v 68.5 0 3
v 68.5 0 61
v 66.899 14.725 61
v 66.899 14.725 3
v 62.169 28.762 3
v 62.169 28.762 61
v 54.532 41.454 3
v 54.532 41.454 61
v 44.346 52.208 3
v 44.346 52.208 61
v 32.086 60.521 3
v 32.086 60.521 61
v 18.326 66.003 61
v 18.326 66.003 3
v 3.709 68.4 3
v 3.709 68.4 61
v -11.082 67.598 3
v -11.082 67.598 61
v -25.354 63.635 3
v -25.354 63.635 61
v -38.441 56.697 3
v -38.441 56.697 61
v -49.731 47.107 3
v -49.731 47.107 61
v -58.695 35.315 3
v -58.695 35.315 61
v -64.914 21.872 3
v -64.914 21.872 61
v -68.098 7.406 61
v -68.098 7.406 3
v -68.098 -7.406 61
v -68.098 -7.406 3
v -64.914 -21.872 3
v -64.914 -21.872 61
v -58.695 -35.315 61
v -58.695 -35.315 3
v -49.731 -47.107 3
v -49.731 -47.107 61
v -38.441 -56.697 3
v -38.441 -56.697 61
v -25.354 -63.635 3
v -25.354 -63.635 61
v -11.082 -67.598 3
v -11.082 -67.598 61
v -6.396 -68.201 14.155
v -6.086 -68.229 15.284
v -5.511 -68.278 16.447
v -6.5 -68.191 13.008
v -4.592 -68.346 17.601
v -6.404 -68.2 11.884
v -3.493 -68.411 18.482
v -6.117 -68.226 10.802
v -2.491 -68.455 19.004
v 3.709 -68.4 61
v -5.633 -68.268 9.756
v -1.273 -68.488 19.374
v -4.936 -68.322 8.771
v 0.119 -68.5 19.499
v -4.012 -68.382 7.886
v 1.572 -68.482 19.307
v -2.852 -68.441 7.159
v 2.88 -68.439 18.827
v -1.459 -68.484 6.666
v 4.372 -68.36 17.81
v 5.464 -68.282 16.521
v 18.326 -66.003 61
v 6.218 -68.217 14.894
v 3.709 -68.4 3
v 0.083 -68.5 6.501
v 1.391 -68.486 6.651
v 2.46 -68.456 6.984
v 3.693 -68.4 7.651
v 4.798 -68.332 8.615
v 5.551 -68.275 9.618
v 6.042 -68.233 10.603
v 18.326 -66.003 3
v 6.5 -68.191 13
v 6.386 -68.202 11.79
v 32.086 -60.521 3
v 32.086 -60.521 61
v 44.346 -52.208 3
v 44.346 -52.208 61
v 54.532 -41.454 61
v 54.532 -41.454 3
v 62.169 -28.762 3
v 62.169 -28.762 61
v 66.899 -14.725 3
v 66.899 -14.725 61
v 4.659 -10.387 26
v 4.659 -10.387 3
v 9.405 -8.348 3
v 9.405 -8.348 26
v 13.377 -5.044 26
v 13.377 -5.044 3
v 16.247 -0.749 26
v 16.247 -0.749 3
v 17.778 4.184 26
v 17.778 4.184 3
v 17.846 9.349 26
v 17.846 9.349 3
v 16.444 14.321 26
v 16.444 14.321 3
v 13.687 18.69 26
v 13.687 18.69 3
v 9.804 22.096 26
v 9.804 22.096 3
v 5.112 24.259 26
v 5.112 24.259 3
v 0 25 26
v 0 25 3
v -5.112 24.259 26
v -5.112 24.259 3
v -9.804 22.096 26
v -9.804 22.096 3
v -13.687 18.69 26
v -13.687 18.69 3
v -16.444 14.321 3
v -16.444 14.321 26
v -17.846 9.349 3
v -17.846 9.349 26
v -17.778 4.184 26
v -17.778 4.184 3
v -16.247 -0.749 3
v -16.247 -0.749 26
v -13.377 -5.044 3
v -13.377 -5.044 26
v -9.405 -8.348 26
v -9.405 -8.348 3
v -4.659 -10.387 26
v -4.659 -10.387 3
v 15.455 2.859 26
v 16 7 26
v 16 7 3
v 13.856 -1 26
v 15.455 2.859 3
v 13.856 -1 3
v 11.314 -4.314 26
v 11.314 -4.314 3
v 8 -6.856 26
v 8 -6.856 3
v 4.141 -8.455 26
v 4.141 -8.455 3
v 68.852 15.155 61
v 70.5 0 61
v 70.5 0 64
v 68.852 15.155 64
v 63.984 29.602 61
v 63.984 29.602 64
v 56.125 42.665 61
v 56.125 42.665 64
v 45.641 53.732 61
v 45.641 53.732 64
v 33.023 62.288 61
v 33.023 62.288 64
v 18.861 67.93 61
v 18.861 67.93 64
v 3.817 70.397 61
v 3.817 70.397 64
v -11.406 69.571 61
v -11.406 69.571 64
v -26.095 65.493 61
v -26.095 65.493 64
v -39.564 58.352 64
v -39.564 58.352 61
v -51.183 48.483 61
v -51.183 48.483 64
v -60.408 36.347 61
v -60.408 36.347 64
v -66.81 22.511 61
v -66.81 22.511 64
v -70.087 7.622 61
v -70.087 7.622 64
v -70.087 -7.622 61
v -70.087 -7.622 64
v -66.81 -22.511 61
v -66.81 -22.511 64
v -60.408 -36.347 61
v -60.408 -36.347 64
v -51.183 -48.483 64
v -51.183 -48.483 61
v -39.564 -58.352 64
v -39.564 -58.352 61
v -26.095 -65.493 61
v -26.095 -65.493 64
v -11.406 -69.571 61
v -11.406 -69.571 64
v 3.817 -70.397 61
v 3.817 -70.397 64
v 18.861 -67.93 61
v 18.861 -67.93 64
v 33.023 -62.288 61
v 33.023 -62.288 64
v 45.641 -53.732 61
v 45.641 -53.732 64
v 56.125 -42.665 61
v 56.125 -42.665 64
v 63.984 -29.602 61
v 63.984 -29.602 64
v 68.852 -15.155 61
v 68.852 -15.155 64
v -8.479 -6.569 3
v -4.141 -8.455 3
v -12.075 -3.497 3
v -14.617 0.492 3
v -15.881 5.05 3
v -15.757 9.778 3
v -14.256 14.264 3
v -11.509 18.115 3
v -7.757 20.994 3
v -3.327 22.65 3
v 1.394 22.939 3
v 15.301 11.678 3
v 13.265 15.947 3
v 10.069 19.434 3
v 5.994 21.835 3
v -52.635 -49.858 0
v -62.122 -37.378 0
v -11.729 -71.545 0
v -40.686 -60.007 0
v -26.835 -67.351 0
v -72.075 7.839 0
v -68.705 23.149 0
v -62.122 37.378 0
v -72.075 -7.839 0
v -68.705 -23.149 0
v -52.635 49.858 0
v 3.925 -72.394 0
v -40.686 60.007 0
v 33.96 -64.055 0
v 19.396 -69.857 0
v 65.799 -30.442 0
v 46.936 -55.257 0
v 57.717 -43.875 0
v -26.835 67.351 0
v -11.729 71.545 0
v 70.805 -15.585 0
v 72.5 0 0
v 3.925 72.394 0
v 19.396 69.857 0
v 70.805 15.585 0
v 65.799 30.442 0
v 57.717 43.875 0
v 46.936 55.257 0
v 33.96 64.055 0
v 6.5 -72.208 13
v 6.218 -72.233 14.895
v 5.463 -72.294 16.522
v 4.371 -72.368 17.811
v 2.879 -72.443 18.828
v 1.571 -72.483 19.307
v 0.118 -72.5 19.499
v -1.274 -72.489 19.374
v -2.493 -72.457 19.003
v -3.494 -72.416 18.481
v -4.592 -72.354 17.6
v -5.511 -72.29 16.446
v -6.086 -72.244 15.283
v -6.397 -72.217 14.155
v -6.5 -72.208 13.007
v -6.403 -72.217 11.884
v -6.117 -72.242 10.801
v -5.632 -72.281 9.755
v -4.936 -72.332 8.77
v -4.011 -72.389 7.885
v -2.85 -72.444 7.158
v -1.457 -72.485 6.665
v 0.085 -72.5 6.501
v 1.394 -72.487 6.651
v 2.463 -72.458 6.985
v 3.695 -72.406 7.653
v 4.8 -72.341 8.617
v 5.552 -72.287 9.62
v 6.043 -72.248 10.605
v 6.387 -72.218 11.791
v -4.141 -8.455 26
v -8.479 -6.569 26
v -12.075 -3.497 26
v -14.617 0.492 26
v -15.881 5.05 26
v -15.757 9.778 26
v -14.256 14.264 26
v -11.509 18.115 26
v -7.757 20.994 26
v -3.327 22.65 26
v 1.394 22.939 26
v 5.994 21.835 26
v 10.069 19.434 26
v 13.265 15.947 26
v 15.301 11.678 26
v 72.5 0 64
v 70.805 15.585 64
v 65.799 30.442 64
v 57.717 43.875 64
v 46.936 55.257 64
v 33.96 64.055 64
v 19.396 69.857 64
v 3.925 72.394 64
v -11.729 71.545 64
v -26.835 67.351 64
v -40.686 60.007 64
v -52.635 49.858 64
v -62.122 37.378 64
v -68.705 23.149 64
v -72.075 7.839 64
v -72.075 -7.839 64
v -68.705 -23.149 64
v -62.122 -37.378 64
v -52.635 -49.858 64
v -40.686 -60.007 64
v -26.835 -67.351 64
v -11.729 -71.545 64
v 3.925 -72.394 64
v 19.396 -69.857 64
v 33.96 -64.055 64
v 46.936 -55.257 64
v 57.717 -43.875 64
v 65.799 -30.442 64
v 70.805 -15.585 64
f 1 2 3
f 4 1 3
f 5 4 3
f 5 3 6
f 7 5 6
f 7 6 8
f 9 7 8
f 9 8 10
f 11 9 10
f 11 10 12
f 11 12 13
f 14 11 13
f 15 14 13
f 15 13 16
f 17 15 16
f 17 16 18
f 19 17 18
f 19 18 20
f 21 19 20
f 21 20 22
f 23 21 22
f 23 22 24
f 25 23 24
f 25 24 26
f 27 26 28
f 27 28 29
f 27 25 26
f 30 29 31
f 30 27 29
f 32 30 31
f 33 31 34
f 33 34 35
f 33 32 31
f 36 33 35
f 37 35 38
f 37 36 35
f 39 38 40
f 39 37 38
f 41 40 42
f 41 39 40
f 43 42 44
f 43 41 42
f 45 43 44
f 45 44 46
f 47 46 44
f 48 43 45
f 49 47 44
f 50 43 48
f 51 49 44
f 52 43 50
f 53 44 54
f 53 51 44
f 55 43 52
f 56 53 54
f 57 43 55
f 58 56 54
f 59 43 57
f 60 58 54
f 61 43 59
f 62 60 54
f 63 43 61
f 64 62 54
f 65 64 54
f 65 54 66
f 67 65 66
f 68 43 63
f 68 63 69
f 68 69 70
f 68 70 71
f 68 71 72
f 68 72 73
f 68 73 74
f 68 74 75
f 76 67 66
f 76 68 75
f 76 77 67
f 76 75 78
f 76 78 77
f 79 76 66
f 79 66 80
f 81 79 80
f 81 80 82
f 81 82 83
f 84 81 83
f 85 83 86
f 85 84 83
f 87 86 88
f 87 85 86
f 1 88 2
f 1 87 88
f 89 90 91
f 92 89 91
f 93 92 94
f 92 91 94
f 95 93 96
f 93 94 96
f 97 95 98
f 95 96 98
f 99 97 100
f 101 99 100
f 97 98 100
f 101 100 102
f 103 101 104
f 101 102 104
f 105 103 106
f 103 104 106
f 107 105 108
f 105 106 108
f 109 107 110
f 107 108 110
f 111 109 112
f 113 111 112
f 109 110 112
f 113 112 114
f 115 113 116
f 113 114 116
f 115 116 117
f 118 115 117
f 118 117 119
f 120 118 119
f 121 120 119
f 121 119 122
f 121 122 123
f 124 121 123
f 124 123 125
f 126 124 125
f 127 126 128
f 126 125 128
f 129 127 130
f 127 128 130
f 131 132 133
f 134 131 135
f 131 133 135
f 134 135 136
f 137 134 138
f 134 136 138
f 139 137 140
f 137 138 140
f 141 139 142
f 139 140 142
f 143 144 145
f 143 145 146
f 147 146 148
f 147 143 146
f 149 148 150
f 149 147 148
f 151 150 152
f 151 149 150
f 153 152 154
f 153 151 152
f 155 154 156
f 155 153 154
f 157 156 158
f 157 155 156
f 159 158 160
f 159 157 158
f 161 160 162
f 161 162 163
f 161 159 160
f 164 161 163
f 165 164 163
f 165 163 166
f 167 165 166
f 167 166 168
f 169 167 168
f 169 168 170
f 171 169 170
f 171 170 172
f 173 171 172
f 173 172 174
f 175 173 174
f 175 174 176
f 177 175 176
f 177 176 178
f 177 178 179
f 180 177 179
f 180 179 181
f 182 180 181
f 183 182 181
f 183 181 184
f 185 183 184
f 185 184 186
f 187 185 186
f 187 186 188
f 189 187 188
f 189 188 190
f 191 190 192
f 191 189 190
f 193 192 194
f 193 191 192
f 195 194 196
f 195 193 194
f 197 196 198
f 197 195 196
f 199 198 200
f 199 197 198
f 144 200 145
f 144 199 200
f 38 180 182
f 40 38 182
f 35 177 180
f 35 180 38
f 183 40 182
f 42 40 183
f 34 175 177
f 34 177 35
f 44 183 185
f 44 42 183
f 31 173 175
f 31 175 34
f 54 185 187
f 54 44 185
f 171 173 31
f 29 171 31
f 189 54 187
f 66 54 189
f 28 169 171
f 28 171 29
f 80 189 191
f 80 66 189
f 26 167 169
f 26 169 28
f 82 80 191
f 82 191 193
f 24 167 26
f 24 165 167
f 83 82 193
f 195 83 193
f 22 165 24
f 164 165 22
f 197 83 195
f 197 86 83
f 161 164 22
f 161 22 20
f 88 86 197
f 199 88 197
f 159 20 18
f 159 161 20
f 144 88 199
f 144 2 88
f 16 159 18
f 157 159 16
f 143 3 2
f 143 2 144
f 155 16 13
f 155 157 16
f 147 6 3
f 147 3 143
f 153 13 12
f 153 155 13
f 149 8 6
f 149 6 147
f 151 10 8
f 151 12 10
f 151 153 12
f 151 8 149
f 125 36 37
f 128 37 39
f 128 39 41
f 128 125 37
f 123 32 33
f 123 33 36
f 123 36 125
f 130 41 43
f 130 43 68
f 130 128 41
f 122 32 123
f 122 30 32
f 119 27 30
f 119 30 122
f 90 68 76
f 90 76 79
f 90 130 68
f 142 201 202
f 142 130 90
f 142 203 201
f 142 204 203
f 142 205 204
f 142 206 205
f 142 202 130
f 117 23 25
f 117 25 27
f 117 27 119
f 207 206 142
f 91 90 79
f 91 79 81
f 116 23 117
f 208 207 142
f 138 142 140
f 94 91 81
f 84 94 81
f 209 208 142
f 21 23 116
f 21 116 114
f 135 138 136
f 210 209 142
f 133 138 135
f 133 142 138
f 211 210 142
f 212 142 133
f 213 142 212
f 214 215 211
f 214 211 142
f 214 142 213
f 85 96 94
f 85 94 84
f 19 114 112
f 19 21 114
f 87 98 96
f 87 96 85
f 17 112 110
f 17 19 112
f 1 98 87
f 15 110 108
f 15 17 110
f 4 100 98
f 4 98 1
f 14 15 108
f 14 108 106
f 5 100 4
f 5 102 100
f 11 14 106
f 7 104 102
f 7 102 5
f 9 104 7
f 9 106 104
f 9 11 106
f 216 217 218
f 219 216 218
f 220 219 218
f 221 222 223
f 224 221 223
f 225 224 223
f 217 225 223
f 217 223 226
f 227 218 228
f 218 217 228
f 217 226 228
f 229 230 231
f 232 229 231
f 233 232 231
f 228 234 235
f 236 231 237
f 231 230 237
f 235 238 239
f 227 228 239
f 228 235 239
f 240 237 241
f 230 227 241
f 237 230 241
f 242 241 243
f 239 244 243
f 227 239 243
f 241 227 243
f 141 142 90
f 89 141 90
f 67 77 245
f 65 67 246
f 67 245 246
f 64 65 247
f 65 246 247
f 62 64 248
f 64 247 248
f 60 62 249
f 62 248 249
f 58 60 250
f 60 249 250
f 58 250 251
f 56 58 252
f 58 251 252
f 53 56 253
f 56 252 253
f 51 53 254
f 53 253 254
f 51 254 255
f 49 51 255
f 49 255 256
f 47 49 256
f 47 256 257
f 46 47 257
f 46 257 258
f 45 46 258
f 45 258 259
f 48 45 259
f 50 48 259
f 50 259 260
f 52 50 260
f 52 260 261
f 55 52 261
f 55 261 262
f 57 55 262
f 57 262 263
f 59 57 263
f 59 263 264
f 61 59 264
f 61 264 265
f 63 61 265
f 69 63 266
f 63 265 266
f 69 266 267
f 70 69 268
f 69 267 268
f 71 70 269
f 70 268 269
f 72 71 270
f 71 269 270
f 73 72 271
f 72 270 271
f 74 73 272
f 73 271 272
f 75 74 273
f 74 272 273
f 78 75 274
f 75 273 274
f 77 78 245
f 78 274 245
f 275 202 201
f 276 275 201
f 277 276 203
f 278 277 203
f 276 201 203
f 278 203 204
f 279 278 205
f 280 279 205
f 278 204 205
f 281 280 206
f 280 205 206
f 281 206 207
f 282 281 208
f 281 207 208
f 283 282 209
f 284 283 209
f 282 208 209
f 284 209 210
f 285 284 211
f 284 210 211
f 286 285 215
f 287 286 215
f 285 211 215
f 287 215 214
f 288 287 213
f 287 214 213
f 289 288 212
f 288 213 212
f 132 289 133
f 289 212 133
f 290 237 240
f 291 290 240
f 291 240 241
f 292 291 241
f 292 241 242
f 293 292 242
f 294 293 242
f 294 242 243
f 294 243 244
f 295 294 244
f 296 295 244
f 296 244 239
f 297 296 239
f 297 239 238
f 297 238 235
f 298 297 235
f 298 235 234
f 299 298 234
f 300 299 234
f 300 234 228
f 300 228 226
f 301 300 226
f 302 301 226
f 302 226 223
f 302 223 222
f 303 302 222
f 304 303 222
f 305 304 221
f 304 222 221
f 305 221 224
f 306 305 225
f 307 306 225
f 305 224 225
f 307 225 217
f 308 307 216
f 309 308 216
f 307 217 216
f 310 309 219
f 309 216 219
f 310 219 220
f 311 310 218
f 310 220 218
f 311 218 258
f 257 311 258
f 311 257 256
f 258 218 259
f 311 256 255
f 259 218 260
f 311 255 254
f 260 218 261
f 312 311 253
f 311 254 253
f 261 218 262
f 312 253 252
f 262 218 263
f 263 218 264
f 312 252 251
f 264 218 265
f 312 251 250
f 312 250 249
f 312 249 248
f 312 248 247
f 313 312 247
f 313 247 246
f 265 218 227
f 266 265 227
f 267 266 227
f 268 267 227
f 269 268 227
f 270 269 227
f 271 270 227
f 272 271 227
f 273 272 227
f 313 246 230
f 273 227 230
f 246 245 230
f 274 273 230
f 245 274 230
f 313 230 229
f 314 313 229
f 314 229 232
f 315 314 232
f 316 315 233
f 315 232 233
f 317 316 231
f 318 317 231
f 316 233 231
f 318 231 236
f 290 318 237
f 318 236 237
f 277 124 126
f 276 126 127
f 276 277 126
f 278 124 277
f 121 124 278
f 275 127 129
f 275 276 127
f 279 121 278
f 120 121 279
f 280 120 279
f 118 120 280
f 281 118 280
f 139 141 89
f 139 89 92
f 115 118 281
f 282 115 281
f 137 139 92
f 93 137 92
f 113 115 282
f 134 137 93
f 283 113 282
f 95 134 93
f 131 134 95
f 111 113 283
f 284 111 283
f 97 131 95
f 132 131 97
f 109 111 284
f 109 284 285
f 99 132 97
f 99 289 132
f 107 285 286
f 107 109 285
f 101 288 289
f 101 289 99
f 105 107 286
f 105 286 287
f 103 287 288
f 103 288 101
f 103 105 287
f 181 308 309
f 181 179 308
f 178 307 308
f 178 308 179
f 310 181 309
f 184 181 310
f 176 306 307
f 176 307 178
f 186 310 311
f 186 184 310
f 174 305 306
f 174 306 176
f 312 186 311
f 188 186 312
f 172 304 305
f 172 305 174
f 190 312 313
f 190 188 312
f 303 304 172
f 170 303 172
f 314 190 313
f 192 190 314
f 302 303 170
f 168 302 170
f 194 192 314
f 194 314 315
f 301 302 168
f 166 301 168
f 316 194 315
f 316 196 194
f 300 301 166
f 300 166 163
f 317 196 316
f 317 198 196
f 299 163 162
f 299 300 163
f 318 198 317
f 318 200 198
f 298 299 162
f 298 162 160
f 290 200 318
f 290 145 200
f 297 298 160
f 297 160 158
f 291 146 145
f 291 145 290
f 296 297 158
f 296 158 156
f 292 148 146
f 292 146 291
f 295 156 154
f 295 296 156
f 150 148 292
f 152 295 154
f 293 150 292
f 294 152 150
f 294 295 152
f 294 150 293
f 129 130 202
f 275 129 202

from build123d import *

# Parameters (mm, degrees)
F0_R     = 72.5
F0_R_2   = 70.5
F1_DEPTH = 64
F0_R_3   = 68.5
F2_DEPTH = 61
F3_DEPTH = 3
F5_DEPTH = 23
F7_R     = 6.5
F8_DEPTH = 25


with BuildPart() as f1:
    # F0 (on Top) → F1 (new body)
    with BuildSketch(Plane.XY):
        Circle(F0_R)
        Circle(F0_R_2, mode=Mode.SUBTRACT)
    extrude(amount=F1_DEPTH)

    # F0 (on Top) → F2 (join)
    with BuildSketch(Plane.XY):
        Circle(F0_R_2)
        Circle(F0_R_3, mode=Mode.SUBTRACT)
    extrude(amount=F2_DEPTH)

    # F0 (on Top) → F3 (join)
    with BuildSketch(Plane.XY):
        Circle(F0_R_3)
    extrude(amount=F3_DEPTH)

    # F4 (on face) → F5 (join)
    with BuildSketch(Plane.XY.offset(3)):
        with BuildLine():
            ThreePointArc((-4.1411047216, -8.4548132206), (-9.7401828641, 19.6936534447), (16, 7))
            ThreePointArc((16, 7), (12.6936534447, -2.7401828641), (4.1411047216, -8.4548132206))
            Line((4.1411047216, -8.4548132206), (4.6587428118, -10.3866648732))
            ThreePointArc((4.6587428118, -10.3866648732), (14.2803601252, -3.9577057222), (18, 7))
            ThreePointArc((18, 7), (-10.9577057222, 21.2803601252), (-4.6587428118, -10.3866648732))
            Line((-4.6587428118, -10.3866648732), (-4.1411047216, -8.4548132206))
        make_face()
    extrude(amount=F5_DEPTH)

    # F7 (on offset) → F8 (cut)
    with BuildSketch(Plane.XZ.offset(80)):
        with Locations((0, 13)):
            Circle(F7_R)
    extrude(amount=-F8_DEPTH, mode=Mode.SUBTRACT)


solid = f1.part
